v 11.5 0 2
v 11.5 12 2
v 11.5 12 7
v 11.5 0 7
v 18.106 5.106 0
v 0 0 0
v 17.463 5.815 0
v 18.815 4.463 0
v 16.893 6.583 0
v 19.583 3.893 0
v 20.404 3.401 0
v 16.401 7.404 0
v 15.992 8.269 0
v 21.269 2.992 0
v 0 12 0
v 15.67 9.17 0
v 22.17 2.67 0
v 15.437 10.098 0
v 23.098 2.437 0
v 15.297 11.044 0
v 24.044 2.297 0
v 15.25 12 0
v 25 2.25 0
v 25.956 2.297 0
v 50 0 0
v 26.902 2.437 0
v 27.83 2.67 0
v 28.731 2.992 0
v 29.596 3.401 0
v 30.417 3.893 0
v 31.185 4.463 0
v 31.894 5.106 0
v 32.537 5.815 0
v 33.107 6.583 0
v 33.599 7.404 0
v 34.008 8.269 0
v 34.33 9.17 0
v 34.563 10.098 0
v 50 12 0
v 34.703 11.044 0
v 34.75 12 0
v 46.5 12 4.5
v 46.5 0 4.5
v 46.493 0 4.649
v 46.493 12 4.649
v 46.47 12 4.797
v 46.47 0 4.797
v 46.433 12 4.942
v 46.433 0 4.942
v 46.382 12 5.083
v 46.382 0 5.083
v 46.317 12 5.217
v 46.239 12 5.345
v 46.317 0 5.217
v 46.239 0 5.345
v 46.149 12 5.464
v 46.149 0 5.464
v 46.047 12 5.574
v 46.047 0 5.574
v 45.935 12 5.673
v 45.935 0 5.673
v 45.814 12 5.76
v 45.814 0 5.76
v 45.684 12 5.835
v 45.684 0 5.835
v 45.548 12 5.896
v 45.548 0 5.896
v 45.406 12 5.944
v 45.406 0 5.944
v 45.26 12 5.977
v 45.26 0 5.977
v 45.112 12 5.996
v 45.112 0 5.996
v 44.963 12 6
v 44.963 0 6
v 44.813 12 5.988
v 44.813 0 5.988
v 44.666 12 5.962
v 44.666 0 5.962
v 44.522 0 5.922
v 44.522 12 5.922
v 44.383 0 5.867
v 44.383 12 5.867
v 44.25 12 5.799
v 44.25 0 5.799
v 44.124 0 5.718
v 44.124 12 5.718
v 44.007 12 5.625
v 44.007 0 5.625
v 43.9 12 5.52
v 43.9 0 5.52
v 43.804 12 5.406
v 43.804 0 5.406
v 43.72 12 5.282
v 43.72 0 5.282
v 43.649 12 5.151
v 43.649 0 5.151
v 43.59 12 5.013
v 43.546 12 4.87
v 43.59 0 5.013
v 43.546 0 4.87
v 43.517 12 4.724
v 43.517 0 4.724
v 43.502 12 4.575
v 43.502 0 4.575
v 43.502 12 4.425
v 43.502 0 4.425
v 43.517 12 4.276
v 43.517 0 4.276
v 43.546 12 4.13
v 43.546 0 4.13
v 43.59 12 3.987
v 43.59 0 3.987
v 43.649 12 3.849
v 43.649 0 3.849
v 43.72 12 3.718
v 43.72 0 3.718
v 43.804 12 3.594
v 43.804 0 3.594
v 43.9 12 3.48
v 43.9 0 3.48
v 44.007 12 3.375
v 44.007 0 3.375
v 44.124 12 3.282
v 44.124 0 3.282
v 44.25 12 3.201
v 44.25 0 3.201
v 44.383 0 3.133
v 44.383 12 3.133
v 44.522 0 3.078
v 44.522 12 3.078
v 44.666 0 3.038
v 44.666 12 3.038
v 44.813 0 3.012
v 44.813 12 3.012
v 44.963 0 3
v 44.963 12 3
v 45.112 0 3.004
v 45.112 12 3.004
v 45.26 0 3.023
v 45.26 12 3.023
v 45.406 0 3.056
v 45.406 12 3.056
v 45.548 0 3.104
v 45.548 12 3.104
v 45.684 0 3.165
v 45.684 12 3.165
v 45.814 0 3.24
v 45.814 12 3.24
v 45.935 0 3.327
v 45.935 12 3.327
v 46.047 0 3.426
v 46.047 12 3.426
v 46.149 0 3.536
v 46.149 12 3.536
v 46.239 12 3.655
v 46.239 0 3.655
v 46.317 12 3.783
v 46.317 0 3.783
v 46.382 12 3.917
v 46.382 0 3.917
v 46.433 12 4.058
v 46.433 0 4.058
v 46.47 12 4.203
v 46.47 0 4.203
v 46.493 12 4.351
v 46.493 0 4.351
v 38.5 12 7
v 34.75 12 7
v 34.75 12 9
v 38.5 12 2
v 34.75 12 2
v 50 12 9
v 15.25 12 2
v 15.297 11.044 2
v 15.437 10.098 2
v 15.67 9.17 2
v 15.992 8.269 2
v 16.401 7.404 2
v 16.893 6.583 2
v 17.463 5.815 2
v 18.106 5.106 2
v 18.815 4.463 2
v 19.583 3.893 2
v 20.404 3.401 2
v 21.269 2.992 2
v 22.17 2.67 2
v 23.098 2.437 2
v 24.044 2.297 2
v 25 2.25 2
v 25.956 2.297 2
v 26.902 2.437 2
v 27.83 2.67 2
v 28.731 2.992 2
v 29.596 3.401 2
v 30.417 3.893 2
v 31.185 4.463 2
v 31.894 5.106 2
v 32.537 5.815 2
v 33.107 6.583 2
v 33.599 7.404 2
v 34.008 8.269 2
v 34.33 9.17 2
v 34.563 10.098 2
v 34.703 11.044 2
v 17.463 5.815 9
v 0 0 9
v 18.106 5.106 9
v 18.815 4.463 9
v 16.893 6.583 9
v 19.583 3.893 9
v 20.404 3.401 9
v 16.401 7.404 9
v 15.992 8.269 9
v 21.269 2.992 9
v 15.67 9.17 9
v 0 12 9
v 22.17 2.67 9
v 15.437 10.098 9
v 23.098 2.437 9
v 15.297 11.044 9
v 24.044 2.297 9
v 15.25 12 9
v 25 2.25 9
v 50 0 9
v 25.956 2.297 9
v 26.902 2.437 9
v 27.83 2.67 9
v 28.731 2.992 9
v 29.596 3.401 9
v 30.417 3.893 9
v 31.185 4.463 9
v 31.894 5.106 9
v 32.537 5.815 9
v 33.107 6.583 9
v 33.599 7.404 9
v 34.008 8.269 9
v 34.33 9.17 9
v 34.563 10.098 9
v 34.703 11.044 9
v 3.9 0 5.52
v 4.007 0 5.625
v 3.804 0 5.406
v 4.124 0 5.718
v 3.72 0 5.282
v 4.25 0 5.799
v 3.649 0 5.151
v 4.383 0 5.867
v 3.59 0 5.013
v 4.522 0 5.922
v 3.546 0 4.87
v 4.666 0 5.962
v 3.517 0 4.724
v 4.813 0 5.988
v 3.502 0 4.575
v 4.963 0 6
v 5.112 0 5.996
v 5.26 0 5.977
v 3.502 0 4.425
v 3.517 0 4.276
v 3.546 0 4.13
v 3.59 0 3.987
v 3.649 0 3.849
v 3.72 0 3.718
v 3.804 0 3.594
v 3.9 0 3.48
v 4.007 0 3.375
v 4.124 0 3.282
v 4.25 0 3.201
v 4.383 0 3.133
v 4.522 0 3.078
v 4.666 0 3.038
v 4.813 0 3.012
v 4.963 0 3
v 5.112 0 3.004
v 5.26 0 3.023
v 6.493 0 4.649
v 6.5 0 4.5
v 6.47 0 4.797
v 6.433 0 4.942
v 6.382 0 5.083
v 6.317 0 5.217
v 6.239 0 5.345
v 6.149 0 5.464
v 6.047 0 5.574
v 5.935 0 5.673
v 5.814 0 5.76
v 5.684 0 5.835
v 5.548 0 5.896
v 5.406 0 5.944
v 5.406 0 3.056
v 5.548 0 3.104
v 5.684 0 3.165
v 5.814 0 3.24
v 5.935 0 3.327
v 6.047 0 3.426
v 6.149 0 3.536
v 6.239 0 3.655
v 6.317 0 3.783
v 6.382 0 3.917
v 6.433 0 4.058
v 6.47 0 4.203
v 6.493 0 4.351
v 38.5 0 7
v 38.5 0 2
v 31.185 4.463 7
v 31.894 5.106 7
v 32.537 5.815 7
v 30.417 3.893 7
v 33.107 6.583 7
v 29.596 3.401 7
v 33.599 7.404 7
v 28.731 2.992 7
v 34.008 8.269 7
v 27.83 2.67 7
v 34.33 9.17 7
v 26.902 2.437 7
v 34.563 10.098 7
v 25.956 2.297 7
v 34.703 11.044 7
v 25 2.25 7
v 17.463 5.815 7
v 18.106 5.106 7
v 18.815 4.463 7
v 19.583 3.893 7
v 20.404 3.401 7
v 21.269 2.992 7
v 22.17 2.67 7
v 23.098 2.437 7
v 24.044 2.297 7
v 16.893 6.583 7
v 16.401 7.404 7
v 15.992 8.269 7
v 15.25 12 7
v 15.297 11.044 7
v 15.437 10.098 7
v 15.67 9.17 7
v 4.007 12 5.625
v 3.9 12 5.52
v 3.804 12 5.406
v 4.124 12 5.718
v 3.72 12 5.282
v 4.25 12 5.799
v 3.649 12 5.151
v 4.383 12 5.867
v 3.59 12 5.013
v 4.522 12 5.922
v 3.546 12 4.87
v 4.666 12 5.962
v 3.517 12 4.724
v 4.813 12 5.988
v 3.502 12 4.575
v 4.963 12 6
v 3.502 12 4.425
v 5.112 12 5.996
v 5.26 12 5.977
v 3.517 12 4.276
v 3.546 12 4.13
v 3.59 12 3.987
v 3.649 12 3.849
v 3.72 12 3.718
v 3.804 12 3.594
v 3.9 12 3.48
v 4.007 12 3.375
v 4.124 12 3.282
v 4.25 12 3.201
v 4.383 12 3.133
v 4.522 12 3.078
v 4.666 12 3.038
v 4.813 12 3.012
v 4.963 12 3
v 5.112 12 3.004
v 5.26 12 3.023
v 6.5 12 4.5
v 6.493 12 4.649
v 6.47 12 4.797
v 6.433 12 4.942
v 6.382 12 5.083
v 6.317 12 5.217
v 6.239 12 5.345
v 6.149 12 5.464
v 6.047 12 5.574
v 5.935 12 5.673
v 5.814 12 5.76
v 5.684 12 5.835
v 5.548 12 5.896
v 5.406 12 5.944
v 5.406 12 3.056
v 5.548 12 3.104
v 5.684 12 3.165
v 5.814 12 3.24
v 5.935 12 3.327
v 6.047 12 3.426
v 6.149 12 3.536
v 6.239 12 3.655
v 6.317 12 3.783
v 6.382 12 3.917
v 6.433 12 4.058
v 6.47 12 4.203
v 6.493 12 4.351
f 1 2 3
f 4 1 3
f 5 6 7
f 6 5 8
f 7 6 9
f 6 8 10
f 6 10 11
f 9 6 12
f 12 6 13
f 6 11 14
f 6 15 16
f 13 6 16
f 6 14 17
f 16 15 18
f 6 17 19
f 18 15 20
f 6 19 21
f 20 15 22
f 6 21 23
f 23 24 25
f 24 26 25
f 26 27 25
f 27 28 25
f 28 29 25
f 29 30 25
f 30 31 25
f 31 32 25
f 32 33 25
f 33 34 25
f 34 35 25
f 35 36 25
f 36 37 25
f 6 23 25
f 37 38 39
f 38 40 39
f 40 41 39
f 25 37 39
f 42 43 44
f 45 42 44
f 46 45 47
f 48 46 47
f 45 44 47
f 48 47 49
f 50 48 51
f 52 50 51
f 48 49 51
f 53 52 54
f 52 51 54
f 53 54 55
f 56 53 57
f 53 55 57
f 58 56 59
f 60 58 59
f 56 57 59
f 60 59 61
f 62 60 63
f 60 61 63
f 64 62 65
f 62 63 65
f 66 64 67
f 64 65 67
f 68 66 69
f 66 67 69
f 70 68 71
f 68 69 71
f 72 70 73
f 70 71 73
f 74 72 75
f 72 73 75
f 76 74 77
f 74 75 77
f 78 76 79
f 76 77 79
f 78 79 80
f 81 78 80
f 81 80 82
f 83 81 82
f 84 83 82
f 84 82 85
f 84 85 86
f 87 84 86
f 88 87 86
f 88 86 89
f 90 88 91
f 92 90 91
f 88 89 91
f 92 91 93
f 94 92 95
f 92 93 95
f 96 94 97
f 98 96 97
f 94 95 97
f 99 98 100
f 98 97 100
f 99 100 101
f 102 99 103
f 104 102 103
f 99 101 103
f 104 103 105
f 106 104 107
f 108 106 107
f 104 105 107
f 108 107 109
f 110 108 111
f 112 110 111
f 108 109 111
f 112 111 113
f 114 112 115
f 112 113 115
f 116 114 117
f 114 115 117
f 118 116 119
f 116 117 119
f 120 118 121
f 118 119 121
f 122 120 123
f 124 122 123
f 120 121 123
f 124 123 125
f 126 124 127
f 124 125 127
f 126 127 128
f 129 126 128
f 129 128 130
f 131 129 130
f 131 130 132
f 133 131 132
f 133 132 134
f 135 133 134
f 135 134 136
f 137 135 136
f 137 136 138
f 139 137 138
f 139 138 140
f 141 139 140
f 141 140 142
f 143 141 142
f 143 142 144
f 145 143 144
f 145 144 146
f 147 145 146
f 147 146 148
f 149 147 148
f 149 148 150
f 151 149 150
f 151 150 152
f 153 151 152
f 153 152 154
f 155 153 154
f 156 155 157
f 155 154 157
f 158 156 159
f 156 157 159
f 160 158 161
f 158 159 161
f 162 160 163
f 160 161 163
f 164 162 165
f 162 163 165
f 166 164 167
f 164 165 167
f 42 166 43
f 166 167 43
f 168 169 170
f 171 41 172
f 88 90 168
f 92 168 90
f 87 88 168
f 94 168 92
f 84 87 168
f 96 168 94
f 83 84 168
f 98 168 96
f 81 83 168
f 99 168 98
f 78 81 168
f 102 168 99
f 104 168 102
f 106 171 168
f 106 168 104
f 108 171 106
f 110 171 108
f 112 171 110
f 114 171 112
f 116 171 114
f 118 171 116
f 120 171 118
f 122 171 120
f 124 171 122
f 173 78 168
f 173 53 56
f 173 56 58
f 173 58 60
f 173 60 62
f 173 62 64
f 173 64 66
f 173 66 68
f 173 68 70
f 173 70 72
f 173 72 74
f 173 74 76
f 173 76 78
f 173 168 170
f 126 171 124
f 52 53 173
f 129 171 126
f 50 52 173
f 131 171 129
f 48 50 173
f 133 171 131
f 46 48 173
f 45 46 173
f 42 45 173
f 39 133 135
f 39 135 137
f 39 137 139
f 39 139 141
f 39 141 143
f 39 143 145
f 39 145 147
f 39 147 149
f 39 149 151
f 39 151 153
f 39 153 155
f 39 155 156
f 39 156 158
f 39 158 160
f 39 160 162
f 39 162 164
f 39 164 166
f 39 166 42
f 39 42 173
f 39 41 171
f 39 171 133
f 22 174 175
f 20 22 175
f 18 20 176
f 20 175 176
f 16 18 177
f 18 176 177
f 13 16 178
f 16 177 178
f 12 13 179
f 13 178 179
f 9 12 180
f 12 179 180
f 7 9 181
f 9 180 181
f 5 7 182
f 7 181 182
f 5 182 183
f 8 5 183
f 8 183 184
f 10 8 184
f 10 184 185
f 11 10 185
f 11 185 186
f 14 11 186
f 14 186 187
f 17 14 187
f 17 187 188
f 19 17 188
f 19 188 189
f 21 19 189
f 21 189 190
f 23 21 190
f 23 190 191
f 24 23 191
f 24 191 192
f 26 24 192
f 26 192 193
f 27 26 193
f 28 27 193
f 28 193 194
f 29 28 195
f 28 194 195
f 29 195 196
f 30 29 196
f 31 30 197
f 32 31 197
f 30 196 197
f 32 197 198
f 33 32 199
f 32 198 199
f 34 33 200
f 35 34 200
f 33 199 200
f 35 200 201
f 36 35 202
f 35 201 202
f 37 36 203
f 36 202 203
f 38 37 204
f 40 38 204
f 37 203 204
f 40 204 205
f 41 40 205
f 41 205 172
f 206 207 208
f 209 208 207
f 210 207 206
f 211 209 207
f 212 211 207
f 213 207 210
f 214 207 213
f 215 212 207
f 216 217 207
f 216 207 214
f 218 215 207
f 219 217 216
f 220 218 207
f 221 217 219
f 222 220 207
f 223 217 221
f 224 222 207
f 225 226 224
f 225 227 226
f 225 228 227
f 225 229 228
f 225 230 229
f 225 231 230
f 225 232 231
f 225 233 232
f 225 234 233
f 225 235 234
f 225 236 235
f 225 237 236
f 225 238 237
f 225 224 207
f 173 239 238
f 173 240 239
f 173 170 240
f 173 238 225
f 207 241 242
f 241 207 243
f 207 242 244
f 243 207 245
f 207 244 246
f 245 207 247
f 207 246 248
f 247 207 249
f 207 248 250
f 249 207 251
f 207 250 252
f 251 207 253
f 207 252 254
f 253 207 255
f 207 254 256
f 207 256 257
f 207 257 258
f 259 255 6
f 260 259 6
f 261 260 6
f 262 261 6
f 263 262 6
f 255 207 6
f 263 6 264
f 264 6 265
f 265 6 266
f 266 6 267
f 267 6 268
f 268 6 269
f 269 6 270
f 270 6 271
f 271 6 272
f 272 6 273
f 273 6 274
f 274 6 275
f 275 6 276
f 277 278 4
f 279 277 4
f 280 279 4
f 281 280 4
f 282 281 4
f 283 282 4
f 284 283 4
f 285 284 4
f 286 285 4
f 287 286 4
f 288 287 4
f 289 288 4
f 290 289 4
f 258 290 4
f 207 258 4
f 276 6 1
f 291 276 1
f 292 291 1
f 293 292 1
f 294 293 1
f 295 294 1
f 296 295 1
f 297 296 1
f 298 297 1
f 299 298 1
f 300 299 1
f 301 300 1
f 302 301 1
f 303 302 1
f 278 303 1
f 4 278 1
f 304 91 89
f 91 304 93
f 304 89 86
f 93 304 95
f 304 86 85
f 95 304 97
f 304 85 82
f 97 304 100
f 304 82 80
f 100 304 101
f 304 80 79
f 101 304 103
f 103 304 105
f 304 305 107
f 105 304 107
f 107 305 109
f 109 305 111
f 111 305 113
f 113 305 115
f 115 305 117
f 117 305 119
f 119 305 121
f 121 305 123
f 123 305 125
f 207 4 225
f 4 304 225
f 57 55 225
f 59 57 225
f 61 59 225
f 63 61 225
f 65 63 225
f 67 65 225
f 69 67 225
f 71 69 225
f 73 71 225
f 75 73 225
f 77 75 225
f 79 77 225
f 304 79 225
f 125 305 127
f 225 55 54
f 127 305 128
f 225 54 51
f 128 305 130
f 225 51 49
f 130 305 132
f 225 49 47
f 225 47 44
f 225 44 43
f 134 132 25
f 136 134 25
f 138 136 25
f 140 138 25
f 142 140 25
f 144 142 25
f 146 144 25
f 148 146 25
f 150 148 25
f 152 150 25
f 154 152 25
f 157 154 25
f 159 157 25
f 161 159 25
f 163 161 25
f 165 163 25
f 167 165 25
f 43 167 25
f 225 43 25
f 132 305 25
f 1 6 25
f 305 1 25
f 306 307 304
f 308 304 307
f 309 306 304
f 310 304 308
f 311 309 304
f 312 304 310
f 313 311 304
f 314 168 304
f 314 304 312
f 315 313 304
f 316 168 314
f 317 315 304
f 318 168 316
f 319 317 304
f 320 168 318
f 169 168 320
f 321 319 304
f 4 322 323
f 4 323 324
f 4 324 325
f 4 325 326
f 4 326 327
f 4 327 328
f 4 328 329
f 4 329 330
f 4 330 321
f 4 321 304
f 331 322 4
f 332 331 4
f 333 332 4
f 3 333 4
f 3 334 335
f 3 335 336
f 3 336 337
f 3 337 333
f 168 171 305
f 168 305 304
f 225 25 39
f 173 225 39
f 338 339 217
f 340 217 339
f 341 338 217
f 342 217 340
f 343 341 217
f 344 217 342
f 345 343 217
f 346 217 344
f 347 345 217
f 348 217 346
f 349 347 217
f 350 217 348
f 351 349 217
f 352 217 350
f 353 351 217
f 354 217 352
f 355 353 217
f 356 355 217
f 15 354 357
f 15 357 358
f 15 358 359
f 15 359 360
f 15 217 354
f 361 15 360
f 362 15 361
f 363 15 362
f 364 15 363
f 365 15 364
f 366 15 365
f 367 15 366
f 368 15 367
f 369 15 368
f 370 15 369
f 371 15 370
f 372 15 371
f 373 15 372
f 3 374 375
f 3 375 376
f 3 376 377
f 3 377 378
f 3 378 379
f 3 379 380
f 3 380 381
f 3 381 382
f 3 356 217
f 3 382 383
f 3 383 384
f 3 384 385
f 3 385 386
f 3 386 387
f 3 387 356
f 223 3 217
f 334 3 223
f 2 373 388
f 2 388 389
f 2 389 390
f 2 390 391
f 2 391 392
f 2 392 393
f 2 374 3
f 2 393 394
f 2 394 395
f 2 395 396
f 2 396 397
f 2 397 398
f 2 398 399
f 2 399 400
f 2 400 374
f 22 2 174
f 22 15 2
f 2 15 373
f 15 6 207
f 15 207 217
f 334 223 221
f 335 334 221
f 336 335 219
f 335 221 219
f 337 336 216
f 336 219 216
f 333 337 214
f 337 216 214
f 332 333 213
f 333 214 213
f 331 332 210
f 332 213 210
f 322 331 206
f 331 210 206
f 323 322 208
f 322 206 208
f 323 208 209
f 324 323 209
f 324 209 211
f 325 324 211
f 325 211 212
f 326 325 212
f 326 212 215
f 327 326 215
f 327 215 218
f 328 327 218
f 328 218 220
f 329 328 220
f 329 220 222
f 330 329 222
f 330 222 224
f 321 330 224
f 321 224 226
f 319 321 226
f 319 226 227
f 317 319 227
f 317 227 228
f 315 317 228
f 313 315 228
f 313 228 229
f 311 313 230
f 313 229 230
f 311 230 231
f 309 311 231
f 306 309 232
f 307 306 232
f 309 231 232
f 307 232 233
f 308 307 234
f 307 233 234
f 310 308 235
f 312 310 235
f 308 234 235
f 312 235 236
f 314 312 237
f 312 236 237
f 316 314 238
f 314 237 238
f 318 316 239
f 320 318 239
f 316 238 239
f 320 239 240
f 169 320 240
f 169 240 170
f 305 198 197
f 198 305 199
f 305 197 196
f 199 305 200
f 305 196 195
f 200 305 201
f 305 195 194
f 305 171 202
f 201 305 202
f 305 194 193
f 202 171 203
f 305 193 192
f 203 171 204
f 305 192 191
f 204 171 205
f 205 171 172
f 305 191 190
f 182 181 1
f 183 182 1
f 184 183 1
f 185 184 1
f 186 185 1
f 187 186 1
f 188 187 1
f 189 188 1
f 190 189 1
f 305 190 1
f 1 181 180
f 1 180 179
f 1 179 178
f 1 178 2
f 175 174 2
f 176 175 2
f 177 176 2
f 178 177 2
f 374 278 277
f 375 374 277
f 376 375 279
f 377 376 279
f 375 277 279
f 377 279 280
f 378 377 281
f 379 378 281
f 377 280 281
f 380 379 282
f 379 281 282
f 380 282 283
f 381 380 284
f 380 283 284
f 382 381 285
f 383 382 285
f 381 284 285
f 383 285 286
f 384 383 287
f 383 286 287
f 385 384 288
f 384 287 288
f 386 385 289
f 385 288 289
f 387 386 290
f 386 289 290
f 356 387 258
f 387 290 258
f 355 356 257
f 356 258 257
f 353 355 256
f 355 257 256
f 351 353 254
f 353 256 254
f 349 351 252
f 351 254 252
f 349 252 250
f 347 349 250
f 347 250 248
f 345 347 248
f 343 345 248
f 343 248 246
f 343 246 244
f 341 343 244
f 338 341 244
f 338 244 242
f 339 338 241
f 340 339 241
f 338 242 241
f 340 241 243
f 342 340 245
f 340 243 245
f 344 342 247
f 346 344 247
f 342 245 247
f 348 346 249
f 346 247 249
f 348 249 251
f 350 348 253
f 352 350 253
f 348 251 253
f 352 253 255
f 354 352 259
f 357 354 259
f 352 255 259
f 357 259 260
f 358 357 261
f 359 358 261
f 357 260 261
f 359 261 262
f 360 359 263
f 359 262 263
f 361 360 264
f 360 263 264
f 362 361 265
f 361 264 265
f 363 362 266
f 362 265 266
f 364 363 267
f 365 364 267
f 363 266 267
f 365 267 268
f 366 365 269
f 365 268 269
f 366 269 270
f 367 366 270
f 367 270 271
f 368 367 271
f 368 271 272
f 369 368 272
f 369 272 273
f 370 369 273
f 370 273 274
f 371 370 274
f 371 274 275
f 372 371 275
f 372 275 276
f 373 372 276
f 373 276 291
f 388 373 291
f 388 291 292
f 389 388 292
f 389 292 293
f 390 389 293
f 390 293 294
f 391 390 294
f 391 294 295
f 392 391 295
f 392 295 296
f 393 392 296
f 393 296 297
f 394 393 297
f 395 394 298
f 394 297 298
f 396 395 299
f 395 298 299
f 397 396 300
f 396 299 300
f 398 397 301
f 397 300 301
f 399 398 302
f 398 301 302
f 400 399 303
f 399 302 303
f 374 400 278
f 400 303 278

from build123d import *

# Parameters (mm, degrees)
F0_W     = 50
F0_H     = 12
F1_DEPTH = 9
F2_R     = 1.5
F3_DEPTH = 12
F4_W     = 27
F4_H     = 5
F5_DEPTH = 12.5
F7_DEPTH = 9


with BuildPart() as f1:
    # F0 (on Top) → F1 (new body)
    with BuildSketch(Plane.XY):
        with Locations((25, 6)):
            Rectangle(F0_W, F0_H)
    extrude(amount=F1_DEPTH)

    # F2 (on face) → F3 (cut)
    with BuildSketch(Plane.XZ):
        with Locations((5, 4.5)):
            Circle(F2_R)
        with Locations((45, 4.5)):
            Circle(F2_R)
    extrude(amount=-F3_DEPTH, mode=Mode.SUBTRACT)

    # F4 (on face) → F5 (cut)
    with BuildSketch(Plane(origin=(0, 12, 0), x_dir=(-1, 0, 0), z_dir=(0, 1, 0))):
        with Locations((-25, 4.5)):
            Rectangle(F4_W, F4_H)
    extrude(amount=-F5_DEPTH, mode=Mode.SUBTRACT)

    # F6 (on face) → F7 (cut)
    with BuildSketch(Plane.XY.offset(9)):
        with BuildLine():
            ThreePointArc((15.25, 12), (25, 2.25), (34.75, 12))
            Line((34.75, 12), (15.25, 12))
        make_face()
    extrude(amount=-F7_DEPTH, mode=Mode.SUBTRACT)


solid = f1.part
